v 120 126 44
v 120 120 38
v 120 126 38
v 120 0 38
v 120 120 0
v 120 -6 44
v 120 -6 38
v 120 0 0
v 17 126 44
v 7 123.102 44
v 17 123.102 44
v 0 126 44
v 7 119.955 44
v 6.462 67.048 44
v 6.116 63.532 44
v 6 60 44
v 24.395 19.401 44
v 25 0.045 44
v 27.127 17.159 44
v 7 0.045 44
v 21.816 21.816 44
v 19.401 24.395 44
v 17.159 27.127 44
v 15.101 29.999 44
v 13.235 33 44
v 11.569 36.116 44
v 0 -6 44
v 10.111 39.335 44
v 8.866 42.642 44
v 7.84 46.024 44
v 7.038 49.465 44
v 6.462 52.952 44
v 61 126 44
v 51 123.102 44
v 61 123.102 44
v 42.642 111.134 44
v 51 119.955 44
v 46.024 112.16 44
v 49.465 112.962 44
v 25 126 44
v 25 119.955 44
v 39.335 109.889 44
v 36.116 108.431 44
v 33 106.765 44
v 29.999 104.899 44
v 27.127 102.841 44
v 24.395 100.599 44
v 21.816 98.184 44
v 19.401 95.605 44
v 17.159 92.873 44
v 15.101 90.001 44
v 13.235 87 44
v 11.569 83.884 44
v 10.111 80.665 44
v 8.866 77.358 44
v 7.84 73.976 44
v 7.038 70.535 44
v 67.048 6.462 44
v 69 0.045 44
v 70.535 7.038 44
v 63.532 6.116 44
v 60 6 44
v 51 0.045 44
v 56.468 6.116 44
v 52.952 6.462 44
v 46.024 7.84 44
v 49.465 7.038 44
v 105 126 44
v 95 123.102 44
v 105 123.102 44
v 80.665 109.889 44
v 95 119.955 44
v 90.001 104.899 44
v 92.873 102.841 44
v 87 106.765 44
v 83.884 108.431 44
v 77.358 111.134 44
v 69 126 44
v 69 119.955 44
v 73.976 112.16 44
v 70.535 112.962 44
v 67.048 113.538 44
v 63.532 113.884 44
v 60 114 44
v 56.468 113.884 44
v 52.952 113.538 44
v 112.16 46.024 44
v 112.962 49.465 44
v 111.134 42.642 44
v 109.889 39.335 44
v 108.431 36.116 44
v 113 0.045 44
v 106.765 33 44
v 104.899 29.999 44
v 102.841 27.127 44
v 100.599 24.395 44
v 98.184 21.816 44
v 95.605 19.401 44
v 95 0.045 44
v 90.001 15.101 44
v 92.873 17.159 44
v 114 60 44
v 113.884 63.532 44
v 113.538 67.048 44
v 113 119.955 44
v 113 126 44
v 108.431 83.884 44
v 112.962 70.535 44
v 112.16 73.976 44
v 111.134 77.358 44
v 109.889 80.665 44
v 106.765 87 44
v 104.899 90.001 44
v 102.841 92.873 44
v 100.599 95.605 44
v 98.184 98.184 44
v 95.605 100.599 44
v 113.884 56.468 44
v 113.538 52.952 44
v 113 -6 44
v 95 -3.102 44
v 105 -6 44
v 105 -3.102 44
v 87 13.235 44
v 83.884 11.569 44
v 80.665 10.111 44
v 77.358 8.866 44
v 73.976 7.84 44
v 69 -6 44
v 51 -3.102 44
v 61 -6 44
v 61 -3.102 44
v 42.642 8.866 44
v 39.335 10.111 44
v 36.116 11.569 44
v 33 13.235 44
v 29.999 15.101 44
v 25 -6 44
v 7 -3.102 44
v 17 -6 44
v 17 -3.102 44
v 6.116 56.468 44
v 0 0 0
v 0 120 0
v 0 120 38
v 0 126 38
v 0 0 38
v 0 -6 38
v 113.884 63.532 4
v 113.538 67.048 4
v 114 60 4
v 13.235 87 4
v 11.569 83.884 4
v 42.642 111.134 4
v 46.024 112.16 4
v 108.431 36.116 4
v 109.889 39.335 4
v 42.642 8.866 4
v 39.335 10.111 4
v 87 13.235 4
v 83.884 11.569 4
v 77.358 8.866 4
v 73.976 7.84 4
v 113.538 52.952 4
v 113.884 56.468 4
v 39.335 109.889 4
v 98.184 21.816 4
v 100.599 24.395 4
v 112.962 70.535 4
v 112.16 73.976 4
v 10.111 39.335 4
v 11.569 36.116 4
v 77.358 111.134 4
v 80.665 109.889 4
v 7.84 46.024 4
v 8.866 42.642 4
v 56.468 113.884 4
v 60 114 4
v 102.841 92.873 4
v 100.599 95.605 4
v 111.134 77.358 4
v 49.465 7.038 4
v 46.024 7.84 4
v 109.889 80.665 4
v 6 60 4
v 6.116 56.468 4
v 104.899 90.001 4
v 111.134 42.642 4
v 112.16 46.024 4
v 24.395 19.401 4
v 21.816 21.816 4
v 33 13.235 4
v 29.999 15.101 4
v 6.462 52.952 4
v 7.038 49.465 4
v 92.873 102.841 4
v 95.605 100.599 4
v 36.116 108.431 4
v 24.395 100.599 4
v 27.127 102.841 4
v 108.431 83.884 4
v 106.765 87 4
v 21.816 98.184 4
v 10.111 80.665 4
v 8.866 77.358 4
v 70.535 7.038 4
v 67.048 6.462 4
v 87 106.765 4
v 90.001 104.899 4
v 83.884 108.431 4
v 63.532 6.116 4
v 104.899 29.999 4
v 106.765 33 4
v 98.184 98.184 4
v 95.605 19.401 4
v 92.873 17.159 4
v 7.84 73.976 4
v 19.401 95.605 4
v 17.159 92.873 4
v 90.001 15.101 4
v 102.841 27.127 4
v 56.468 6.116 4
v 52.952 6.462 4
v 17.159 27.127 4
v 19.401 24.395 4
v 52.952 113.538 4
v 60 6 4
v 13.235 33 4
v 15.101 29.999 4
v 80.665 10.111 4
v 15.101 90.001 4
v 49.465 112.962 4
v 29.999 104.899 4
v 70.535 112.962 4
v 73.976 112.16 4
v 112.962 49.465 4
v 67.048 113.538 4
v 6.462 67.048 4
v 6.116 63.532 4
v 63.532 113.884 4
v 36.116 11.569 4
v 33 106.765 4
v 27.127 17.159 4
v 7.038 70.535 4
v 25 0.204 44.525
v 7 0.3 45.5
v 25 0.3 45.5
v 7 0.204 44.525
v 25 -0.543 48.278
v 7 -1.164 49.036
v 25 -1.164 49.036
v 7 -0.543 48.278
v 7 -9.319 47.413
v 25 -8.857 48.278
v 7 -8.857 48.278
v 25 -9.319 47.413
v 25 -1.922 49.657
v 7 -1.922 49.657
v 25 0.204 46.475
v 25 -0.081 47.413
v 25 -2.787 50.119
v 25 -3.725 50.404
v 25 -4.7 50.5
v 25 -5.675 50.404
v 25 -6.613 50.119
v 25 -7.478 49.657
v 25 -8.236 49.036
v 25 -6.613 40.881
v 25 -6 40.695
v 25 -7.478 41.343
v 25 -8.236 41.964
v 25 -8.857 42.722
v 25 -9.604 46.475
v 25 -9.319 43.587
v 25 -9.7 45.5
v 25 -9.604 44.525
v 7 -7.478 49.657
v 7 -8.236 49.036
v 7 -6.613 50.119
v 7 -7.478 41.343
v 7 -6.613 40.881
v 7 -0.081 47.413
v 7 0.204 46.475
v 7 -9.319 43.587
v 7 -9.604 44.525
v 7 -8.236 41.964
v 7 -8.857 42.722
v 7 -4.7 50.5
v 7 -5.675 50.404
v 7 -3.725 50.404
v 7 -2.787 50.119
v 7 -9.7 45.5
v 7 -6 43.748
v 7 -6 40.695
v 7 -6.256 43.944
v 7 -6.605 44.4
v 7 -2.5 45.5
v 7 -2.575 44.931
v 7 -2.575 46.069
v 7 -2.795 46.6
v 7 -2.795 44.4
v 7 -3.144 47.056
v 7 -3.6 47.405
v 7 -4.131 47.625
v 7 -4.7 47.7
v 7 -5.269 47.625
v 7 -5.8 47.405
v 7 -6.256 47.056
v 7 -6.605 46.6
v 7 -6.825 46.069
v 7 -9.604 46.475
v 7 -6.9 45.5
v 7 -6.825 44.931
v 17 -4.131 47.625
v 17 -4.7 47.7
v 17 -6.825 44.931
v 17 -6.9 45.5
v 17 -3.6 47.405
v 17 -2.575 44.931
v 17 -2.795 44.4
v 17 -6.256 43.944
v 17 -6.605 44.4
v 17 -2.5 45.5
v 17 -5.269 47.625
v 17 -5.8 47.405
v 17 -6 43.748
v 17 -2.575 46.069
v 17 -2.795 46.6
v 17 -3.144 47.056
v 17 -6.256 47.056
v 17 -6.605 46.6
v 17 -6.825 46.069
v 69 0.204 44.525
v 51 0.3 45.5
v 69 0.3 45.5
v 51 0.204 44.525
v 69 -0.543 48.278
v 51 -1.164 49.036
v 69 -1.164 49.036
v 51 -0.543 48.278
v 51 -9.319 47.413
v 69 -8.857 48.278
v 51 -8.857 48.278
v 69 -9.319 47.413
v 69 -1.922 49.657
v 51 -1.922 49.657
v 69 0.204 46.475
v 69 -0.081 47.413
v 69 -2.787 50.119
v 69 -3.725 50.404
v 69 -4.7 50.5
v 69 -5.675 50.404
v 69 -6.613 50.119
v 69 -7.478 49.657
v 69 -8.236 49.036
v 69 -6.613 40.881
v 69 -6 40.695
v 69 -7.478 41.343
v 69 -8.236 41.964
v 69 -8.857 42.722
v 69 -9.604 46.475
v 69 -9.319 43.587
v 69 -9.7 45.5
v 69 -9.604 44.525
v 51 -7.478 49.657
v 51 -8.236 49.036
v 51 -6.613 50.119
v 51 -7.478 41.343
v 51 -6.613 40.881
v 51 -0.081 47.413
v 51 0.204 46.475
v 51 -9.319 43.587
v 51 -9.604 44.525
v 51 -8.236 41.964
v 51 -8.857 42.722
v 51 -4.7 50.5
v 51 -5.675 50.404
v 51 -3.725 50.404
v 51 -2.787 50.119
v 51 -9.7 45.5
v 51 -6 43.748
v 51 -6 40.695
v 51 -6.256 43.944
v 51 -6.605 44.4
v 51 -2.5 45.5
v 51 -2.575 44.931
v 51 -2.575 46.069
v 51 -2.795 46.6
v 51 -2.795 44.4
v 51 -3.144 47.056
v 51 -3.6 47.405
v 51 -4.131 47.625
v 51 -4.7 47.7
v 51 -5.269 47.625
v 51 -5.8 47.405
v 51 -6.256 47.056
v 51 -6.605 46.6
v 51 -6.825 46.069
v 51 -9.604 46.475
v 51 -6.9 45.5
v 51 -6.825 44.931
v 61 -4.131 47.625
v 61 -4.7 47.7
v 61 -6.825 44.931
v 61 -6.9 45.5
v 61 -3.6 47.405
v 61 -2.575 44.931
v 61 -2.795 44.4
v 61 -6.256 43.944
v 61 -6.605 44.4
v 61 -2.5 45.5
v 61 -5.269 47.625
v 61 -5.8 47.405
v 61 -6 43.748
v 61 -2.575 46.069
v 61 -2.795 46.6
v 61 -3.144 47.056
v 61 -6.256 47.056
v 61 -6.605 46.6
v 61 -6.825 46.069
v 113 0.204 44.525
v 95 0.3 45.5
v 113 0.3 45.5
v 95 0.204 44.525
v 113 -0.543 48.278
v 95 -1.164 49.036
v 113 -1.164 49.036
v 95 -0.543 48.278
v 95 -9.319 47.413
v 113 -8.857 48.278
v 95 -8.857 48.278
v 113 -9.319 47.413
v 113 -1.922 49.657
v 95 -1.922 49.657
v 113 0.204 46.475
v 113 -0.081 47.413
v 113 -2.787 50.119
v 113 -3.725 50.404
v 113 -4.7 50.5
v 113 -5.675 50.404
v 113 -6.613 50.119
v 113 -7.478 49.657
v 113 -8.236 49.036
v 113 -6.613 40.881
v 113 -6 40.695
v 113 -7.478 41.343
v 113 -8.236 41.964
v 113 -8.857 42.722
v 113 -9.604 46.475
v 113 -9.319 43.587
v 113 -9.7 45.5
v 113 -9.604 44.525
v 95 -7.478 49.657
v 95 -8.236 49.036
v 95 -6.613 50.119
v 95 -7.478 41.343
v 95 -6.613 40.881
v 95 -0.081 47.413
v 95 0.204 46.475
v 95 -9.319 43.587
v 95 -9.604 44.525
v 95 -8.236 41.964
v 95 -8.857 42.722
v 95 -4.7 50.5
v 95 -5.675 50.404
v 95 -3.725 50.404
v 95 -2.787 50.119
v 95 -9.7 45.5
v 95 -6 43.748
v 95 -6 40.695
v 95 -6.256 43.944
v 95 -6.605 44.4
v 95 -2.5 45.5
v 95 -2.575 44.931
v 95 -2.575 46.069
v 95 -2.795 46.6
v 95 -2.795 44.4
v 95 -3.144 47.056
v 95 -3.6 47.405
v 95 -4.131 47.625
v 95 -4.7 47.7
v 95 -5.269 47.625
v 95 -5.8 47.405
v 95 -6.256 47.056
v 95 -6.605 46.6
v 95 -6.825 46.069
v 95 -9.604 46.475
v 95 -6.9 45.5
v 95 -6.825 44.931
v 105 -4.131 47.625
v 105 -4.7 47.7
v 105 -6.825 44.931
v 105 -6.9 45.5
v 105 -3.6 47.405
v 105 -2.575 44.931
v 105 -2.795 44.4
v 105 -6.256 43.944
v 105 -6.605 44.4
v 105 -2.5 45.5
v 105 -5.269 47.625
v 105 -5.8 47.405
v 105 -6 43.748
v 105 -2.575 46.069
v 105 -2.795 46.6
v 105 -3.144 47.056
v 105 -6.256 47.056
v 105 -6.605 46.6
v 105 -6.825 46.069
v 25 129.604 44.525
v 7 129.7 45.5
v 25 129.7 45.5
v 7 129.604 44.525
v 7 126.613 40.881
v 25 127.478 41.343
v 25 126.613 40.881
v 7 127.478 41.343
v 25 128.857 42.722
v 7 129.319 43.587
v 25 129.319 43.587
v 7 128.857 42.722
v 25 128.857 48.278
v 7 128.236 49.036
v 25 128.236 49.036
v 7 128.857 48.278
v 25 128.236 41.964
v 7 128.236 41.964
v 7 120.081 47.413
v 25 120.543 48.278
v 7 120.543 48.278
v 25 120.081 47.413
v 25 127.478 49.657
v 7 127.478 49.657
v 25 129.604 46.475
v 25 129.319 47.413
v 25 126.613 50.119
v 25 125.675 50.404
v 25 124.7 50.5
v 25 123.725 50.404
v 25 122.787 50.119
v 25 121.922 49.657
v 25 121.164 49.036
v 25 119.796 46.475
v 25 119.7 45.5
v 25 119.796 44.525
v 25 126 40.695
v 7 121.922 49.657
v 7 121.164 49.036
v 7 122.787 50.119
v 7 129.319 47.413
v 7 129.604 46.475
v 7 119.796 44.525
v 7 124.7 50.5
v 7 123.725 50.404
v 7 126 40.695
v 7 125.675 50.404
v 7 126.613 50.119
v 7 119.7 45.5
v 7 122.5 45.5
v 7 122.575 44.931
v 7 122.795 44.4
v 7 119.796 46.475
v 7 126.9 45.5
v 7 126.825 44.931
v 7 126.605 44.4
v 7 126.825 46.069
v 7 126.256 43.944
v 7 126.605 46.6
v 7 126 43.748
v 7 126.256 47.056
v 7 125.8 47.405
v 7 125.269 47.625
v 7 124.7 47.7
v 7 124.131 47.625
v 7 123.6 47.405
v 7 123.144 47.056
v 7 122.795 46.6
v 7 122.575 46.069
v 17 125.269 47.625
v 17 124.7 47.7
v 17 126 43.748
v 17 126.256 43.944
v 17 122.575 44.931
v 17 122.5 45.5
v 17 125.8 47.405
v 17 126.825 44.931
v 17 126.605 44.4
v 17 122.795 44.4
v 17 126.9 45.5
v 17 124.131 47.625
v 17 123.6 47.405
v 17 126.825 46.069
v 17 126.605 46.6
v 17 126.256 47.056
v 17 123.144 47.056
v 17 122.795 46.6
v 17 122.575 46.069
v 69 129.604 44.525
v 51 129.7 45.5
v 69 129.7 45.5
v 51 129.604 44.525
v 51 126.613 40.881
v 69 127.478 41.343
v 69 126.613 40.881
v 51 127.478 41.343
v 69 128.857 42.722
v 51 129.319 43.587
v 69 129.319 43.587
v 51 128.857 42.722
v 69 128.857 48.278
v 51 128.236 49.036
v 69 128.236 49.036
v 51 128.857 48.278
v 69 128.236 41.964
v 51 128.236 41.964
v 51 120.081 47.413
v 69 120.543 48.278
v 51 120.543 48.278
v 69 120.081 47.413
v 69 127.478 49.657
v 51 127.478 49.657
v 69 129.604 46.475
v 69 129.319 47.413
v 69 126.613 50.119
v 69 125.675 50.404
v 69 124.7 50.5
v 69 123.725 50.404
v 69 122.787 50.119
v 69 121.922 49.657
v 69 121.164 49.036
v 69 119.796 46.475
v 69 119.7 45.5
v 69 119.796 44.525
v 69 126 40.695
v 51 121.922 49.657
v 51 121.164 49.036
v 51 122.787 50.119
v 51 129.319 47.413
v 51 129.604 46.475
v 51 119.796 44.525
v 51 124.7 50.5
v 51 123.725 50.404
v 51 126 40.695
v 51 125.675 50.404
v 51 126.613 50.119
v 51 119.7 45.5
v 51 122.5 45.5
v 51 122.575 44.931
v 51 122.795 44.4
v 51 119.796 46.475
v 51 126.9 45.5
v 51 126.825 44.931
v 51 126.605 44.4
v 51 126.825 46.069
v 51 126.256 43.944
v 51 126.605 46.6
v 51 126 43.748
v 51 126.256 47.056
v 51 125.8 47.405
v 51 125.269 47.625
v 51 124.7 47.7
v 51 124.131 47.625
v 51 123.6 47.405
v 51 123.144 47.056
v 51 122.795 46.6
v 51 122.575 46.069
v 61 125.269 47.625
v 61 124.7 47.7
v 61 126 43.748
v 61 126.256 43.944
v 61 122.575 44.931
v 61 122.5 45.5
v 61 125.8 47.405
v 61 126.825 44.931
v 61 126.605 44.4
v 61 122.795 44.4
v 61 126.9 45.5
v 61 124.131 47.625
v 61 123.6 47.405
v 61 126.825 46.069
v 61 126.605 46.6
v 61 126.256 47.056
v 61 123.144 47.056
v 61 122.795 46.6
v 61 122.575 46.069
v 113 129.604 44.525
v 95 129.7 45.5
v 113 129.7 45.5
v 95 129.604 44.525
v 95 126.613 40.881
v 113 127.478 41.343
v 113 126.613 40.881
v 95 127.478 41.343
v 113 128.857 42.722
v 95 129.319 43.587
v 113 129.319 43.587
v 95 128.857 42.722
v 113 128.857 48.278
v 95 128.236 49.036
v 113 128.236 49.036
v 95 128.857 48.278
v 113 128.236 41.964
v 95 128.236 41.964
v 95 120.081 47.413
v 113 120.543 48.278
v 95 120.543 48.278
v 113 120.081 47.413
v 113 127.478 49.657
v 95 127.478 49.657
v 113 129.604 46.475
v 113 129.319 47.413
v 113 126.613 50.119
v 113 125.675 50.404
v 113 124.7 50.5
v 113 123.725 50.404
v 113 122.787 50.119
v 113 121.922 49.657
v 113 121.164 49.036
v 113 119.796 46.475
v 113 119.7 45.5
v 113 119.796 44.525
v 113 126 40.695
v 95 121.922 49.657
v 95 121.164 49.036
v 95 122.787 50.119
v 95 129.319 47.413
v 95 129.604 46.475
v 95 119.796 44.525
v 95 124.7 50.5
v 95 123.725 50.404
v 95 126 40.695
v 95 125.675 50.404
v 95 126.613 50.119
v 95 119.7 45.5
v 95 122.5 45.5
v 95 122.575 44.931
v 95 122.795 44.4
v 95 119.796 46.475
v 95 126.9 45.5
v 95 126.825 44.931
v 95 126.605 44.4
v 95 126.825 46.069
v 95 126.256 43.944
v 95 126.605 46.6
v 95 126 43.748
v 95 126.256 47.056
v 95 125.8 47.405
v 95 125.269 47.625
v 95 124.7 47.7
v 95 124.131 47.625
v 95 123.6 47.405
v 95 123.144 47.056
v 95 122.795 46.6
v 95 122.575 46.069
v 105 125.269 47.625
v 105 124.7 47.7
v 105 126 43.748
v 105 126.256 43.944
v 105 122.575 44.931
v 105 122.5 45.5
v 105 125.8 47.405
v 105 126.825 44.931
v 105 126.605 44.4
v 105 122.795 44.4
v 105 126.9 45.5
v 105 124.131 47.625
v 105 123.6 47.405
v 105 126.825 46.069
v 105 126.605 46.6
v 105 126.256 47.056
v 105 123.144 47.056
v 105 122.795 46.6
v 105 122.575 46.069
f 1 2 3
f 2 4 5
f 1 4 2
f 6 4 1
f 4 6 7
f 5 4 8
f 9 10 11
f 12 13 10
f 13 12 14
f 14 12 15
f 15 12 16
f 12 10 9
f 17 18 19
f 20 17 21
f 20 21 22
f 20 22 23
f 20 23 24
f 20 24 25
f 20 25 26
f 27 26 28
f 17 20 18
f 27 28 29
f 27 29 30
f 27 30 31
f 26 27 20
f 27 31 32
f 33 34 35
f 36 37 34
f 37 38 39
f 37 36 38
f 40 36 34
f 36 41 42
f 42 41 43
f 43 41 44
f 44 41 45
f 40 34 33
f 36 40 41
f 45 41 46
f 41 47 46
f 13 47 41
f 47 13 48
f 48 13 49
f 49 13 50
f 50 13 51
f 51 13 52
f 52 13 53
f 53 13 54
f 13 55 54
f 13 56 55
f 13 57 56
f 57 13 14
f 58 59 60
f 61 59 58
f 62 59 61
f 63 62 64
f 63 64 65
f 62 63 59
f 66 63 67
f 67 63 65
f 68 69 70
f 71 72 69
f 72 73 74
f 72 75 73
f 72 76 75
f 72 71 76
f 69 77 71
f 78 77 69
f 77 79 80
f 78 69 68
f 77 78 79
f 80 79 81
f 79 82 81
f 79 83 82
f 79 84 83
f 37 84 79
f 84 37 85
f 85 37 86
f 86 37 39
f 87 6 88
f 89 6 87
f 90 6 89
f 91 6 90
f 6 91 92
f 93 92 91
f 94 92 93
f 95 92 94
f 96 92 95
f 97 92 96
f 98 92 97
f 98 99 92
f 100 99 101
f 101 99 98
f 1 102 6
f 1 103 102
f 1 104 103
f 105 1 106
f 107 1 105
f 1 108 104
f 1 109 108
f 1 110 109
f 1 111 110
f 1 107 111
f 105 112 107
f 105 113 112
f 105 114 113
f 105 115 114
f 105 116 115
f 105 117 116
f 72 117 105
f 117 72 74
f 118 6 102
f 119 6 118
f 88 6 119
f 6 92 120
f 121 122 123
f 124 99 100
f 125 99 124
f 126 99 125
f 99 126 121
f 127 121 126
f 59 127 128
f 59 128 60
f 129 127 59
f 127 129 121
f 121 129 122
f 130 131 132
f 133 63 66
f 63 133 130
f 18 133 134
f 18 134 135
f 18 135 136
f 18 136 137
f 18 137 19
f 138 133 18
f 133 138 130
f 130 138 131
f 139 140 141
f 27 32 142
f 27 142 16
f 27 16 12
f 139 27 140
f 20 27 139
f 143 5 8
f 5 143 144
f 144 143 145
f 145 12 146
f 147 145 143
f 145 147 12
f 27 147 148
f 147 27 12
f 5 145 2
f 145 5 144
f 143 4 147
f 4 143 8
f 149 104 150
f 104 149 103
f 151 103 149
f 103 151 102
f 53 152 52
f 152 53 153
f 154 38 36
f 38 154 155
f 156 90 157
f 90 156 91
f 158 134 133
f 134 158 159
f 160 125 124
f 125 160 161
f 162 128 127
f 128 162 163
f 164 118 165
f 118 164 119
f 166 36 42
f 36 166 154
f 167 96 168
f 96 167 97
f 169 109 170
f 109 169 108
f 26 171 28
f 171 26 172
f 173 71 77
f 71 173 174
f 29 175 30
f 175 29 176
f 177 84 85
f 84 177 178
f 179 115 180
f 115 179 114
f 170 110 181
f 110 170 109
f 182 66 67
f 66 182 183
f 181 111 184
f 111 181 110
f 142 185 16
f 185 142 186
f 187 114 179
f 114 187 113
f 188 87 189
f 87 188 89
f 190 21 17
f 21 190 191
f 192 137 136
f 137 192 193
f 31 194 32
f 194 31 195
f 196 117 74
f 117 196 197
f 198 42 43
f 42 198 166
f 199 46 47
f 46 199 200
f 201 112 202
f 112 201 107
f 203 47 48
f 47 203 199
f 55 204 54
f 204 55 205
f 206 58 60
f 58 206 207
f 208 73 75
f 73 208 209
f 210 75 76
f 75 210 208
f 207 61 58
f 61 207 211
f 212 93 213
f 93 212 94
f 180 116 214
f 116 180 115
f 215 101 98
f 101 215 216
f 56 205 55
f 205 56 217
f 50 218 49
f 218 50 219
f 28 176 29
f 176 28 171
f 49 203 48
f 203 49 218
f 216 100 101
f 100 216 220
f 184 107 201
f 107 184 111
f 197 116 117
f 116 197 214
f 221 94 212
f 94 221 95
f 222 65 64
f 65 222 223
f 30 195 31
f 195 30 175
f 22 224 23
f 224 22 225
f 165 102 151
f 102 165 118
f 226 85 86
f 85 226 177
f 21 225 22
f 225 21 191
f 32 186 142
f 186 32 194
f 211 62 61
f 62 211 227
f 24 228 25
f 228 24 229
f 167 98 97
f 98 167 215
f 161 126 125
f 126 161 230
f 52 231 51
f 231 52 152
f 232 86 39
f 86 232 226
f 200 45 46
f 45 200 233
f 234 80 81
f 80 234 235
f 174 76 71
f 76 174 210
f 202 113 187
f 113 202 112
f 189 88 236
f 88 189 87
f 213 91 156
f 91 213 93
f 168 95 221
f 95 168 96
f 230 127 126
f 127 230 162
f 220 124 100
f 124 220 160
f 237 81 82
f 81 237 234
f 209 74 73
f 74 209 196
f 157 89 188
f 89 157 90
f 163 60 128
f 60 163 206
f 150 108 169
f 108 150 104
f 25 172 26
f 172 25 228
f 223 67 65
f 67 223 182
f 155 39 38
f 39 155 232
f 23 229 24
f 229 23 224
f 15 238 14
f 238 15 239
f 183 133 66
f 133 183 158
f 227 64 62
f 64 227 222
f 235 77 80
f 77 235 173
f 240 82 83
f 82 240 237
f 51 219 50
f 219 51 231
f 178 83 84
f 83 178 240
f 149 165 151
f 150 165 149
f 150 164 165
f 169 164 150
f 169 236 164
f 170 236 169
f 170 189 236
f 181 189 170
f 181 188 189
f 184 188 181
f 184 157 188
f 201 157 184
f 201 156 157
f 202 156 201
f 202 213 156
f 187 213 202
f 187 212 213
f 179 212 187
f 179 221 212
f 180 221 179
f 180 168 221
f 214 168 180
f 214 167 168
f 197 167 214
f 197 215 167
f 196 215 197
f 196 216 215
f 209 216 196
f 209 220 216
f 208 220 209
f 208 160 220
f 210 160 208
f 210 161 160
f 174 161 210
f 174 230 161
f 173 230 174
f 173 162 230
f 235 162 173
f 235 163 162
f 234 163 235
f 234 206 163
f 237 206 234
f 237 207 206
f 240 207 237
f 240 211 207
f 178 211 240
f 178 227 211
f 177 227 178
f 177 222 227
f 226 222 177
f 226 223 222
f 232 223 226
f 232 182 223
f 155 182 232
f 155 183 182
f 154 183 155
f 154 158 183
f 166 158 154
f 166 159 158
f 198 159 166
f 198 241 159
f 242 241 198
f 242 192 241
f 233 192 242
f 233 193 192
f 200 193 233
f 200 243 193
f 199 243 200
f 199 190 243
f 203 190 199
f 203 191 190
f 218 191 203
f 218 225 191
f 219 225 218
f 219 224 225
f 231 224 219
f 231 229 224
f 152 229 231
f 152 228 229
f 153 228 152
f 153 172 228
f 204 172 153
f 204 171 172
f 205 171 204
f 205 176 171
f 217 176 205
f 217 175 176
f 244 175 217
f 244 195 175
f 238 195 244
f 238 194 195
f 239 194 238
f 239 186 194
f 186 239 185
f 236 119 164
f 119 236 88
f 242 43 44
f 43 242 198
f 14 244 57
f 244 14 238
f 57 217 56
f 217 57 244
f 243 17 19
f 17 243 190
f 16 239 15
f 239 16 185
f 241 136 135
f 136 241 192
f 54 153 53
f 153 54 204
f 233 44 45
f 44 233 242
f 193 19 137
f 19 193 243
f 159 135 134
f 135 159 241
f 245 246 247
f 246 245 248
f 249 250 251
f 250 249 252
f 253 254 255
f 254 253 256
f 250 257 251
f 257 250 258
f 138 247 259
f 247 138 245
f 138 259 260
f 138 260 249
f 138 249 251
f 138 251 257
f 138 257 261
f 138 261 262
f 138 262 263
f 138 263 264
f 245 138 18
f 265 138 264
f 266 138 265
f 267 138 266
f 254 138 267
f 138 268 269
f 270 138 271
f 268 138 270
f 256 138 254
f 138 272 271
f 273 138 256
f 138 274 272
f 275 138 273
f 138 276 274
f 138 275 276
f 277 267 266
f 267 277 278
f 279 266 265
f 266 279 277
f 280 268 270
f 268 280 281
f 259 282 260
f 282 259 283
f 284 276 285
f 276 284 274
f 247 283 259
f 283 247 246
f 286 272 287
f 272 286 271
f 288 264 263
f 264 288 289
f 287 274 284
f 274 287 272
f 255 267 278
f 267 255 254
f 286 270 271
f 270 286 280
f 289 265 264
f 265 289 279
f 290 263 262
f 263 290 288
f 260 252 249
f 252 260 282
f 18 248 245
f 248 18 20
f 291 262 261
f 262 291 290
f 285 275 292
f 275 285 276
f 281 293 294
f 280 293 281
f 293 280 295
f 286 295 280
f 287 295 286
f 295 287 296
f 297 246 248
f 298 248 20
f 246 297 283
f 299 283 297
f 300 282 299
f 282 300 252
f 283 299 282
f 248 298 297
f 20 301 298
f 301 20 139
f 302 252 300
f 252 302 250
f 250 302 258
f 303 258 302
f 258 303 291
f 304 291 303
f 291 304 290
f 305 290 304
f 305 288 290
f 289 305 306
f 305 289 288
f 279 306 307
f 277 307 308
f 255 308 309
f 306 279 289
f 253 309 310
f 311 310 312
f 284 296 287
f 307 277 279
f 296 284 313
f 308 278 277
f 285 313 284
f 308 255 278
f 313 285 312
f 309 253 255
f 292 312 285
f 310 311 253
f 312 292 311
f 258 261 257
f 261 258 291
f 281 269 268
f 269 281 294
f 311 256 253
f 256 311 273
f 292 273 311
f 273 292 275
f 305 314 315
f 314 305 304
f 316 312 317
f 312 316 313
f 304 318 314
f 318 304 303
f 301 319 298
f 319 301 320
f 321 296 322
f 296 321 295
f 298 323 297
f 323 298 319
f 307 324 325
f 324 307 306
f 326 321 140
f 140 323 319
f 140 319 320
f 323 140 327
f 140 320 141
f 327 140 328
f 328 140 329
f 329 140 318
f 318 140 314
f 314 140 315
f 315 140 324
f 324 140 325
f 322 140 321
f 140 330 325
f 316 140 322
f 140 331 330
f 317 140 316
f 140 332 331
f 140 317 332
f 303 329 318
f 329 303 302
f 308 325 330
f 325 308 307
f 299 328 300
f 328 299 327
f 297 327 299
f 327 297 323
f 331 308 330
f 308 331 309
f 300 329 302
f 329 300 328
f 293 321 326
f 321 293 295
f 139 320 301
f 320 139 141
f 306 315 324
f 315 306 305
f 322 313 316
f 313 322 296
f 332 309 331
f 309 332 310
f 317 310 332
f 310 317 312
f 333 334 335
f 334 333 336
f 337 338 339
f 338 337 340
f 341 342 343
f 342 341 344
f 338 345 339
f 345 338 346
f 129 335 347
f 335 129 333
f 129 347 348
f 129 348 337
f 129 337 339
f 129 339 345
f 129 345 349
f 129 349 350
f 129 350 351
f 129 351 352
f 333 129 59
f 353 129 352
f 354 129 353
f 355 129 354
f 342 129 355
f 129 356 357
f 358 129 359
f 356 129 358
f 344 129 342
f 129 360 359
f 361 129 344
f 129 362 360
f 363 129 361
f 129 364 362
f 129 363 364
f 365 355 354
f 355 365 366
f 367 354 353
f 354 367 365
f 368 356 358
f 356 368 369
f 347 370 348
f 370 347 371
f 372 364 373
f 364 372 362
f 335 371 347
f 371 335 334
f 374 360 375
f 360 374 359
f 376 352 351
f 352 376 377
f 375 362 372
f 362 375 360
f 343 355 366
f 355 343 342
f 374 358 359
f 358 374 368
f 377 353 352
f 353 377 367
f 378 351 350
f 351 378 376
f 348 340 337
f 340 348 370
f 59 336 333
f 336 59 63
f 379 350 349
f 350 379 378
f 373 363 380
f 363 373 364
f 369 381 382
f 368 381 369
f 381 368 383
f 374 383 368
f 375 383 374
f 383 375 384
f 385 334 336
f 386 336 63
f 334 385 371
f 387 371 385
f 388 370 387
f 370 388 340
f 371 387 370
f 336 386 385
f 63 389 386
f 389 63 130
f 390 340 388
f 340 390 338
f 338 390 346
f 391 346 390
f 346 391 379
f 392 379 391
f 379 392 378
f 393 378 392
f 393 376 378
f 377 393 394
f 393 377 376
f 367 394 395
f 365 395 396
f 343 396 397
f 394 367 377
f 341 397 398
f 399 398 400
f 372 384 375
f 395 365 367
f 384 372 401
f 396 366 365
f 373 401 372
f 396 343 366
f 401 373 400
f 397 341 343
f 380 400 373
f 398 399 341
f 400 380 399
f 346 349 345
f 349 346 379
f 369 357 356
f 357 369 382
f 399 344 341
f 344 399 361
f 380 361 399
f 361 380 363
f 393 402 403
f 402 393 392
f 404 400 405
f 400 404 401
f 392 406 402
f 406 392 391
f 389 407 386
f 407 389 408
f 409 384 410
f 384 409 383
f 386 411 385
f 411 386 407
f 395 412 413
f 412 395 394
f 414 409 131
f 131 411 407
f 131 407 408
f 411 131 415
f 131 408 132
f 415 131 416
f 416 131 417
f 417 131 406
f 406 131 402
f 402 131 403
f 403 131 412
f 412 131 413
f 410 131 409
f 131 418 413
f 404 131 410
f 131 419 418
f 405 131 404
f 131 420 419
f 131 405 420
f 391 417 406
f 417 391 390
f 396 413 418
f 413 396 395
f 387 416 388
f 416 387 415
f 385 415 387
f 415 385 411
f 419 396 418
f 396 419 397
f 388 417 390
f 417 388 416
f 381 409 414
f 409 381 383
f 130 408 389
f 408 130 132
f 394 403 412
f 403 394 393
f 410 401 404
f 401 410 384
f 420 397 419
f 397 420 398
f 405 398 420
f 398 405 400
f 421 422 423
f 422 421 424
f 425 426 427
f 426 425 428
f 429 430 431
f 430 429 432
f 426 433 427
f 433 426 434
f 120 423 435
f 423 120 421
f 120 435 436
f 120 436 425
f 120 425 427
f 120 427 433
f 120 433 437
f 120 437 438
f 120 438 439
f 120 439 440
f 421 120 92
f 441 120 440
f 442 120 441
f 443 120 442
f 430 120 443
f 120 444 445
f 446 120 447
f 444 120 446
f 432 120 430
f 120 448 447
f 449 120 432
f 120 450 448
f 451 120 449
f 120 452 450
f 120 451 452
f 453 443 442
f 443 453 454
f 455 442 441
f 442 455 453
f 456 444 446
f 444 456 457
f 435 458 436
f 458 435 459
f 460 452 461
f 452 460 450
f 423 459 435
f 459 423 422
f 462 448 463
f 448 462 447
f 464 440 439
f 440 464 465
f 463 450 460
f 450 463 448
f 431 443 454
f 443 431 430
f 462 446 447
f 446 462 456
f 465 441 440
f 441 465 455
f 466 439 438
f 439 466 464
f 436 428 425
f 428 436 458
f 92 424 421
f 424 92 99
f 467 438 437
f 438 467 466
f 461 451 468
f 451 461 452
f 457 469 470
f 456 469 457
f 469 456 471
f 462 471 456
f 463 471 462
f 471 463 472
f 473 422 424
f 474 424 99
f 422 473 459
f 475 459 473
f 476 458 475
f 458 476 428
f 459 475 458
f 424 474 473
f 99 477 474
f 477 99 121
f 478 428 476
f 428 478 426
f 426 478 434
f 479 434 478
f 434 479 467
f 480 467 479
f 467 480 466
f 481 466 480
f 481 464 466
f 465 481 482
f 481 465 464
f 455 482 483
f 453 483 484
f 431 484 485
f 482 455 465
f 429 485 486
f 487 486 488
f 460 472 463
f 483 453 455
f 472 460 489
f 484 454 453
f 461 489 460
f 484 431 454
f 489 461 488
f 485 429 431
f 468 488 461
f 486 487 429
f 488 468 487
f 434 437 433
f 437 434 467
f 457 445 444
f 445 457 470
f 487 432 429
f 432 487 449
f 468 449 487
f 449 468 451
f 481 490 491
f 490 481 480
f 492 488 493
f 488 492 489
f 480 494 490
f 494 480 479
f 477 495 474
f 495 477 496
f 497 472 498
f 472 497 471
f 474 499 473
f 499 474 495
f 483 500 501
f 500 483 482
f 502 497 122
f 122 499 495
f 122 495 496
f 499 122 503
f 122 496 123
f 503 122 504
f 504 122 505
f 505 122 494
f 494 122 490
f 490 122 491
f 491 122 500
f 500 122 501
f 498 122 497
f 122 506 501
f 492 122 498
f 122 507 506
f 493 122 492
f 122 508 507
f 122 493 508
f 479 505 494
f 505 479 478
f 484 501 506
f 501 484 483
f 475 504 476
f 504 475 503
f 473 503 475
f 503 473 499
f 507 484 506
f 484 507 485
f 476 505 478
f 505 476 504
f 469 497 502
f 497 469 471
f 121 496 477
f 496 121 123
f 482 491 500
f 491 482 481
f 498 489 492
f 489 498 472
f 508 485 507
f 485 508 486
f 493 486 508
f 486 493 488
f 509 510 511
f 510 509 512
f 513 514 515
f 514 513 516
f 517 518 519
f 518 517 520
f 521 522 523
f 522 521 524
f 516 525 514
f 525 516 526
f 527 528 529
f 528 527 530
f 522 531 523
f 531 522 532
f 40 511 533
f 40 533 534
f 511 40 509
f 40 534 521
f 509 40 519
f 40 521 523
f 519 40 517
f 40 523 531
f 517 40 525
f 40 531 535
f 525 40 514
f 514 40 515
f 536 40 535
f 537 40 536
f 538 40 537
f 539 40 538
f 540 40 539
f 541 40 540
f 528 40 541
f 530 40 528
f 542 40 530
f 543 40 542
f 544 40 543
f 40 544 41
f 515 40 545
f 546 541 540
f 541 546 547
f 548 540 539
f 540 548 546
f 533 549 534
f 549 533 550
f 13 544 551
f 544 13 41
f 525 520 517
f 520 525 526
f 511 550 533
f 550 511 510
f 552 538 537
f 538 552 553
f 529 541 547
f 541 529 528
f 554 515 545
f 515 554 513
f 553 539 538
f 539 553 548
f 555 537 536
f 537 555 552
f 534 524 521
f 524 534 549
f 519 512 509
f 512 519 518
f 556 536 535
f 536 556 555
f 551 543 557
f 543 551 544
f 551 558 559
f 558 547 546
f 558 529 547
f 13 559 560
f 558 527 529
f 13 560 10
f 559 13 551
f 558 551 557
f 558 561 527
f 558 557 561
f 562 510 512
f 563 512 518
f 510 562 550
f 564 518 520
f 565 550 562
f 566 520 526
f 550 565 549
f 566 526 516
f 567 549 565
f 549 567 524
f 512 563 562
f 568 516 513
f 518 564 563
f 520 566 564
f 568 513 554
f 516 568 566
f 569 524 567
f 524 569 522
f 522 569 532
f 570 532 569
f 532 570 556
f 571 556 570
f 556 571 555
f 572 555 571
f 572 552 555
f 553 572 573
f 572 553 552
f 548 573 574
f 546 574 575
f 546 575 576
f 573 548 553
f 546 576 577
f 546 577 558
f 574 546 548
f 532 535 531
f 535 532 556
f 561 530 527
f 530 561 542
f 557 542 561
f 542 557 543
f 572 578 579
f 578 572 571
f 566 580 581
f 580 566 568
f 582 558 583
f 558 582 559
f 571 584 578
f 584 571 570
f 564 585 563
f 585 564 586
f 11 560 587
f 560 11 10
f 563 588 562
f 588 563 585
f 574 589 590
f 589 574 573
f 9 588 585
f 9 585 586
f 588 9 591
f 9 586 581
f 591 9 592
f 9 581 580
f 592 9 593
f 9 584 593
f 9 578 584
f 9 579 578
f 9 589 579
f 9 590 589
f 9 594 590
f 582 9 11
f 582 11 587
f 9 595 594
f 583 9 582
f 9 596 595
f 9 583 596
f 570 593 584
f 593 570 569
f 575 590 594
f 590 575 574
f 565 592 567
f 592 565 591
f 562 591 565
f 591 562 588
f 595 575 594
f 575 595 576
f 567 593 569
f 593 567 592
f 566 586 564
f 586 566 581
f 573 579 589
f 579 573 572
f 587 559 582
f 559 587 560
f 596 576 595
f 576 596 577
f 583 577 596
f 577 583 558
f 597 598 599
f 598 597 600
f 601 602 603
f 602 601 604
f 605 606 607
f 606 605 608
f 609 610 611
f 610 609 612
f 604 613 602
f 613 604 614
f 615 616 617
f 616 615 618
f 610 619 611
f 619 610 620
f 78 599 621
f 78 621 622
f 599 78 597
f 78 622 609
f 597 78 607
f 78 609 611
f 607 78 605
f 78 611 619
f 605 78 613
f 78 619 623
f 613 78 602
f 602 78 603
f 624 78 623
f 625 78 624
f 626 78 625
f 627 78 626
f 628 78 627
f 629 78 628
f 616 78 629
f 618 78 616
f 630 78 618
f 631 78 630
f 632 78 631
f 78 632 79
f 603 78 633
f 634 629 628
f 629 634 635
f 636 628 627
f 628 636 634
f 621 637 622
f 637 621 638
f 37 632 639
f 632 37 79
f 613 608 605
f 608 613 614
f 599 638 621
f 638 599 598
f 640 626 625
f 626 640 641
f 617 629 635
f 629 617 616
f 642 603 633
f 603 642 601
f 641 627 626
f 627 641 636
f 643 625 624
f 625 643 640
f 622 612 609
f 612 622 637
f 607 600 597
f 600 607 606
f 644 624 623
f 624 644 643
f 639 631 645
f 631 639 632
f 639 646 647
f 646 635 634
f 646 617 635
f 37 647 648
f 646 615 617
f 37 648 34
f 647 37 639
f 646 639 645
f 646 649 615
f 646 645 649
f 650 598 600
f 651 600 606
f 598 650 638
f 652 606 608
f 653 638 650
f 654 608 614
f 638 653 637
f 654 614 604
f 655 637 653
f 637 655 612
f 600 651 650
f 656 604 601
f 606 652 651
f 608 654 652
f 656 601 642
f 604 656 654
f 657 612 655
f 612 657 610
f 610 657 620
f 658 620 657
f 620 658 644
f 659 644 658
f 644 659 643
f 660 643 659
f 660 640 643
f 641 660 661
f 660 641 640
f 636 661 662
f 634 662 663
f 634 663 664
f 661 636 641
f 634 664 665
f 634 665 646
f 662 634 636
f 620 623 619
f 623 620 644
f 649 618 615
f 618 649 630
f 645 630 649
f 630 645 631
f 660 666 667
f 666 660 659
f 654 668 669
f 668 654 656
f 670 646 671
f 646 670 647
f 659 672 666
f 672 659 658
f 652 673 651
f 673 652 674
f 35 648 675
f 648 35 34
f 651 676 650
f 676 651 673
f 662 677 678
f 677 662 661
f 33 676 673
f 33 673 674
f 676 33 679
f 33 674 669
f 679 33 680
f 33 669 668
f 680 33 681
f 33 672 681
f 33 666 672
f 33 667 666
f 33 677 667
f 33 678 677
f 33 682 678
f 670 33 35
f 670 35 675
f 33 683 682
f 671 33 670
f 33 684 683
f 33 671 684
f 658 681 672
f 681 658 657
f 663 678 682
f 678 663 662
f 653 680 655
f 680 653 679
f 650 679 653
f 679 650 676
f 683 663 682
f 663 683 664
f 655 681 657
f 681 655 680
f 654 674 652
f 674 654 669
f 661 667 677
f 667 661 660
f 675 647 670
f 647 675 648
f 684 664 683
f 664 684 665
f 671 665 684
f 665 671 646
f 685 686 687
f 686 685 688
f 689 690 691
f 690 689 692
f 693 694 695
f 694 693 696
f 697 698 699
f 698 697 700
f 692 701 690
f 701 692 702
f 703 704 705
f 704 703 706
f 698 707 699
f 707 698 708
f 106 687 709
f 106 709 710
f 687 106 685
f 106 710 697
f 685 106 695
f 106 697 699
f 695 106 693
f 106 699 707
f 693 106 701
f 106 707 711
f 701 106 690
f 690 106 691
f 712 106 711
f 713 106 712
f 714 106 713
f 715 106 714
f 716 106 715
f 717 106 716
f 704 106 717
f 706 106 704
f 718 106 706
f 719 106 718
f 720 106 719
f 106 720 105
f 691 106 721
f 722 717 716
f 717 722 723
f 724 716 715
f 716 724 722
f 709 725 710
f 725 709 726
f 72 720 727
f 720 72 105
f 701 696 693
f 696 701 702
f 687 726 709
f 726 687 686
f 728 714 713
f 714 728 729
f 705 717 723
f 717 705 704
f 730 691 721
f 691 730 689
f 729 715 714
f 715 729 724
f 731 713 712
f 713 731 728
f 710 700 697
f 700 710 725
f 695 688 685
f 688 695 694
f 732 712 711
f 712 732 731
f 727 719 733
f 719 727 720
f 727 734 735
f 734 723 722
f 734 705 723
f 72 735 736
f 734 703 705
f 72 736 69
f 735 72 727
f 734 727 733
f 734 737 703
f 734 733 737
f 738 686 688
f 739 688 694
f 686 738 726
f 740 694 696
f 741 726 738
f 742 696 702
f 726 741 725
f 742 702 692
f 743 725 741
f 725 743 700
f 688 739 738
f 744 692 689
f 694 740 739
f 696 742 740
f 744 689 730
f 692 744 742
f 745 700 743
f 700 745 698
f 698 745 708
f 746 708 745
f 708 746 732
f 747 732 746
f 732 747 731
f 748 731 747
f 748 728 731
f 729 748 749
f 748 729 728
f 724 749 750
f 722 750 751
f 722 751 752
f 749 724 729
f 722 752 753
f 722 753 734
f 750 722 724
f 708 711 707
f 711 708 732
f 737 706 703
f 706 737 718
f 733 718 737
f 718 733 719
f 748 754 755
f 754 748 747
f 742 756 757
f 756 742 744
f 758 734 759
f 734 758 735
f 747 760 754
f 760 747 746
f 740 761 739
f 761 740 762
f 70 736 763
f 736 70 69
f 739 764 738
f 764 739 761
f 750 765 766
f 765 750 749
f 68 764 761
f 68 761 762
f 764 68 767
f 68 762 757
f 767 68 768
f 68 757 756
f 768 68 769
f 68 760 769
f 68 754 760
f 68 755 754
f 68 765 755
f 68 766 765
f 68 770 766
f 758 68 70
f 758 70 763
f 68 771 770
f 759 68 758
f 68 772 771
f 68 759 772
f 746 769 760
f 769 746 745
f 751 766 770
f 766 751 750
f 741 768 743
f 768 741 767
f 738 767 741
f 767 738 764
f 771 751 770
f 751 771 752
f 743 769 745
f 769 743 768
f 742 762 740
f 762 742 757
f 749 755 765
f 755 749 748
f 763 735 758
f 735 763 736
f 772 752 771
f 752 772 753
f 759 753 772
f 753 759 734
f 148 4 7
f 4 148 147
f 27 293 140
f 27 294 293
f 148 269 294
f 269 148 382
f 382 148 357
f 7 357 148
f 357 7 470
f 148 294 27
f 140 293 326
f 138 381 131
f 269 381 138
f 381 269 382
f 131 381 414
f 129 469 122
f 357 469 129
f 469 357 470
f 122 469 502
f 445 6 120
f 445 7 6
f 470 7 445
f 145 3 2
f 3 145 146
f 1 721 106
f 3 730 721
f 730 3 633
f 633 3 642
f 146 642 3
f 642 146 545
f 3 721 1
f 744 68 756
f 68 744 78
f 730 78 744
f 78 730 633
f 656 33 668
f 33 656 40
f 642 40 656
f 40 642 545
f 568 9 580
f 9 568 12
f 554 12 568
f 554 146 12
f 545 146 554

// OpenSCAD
// file: hinge_v2.scad
// ============================================================
// hinge_v2.scad — shared piano-hinge knuckle geometry
// Pattern along the hinge edge: BASE-FLAP-BASE-FLAP-BASE (5 segments)
// Segment index 0,2,4 = fixed to BASE (rod spins freely inside)
// Segment index 1,3   = fixed to FLAP (rod glued/pinned, rotates with flap)
// ============================================================
include <params_v2.scad>

PATTERN_TOTAL = 5 * KNUCKLE_LEN + 4 * KNUCKLE_GAP;
PATTERN_MARGIN = (FLAP_LEN - PATTERN_TOTAL) / 2;

// Returns the x-start position of segment index i (0..4)
function knuckle_x(i) = PATTERN_MARGIN + i * (KNUCKLE_LEN + KNUCKLE_GAP);

// A single knuckle cylinder, axis along X, with a through-bore for the rod.
// hole_d: ROD_D + ROD_CLEARANCE for a bearing (base) knuckle,
//         ROD_D + 0.1 for a tight/glued (flap) knuckle.
module knuckle(hole_d) {
    difference() {
        rotate([0, 90, 0])
            cylinder(d = KNUCKLE_OD, h = KNUCKLE_LEN, $fn = 32);
        rotate([0, 90, 0])
            cylinder(d = hole_d, h = KNUCKLE_LEN + 2, center = true, $fn = 24);
    }
}

// Row of knuckles at given indices, positioned along X starting at x_offset,
// centered on Y=0 locally (caller translates to the actual hinge edge).
module knuckle_row(indices, hole_d, x_offset = 0) {
    for (i = indices) {
        translate([x_offset + knuckle_x(i), 0, 0])
            knuckle(hole_d);
    }
}

BASE_KNUCKLE_INDICES = [0, 2, 4];
FLAP_KNUCKLE_INDICES = [1, 3];
// file: params_v2.scad
// ============================================================
// Cat Bowl v1 — Round Bowl + Dual Trapdoor Flaps (piano-hinge)
// params_v2.scad — all key dimensions live here
// ============================================================
// NOTE: Independent of the old params.scad (rectangular body /
// halo antenna / hopper design). This is a clean start for the
// current hardware: round 108mm bowl + 2x MG996R servos.
// ============================================================

$fn = 64;

// ---- Bowl (as given: 108mm diameter, 40mm deep) ----
BOWL_DIA      = 108;
BOWL_DEPTH    = 40;
BOWL_RADIUS   = BOWL_DIA / 2;

// ---- Base block (square footprint, round pocket inside) ----
WALL          = 6;                       // wall thickness around bowl pocket
FLOOR_T       = 4;                       // floor thickness under bowl
BASE_SIZE     = BOWL_DIA + 2 * WALL;     // 120mm square
BASE_HEIGHT   = BOWL_DEPTH + FLOOR_T;    // 44mm — top of base = hinge rod height

// ---- Flap (two rectangular flaps, each covers half the top) ----
FLAP_LEN      = BASE_SIZE;               // runs full width along hinge edge (120mm)
FLAP_OVERLAP  = 4;                       // extra reach past centerline for sealing
FLAP_DEPTH    = BASE_SIZE / 2 + FLAP_OVERLAP;  // 64mm
FLAP_T        = 3;                       // flap panel thickness

// ---- Piano hinge (rod + knuckles) ----
ROD_D         = 4;                       // steel/brass rod diameter (verify what you have)
ROD_CLEARANCE = 0.4;                     // bearing clearance for knuckles that spin freely
KNUCKLE_OD    = ROD_D + 6;               // 10mm knuckle outer diameter
KNUCKLE_LEN   = 18;                      // length of each knuckle segment
KNUCKLE_GAP   = 4;                       // gap between knuckle segments
// Alternating pattern along the FLAP_LEN edge: base-flap-base-flap-base (5 segments)
// 3 fixed (base) knuckles + 2 rotating (flap) knuckles, interleaved
ROD_END_PROTRUDE = 12;                   // rod extends past the base footprint for servo coupling
ROD_LENGTH    = FLAP_LEN + 2 * ROD_END_PROTRUDE;
// Rod axis sits at the flap's mid-thickness height when the flap is closed
// and resting on top of the base — NOT at the bare top surface.
ROD_AXIS_Z    = BASE_HEIGHT + FLAP_T / 2;

// ---- MG996R servo (verify with calipers once yours arrive) ----
SERVO_W       = 40.7;   // body length
SERVO_D       = 19.7;   // body width/depth
SERVO_H       = 42.9;   // body height (shaft side up)
SERVO_SHAFT_OFFSET = 30.9; // distance from back edge to shaft, along SERVO_W
SERVO_TAB_SPAN = 54.5;  // outer tab-to-tab width
SERVO_TAB_HOLE_SPACING = 10; // hole spacing within each tab
SERVO_HORN_OD = 24;     // round disc horn diameter (verify)
SERVO_HORN_BOLT_CIRCLE = 19; // horn screw hole circle diameter (verify)

// ---- Mounting hardware ----
M3_CLEAR      = 3.4;    // M3 clearance hole
M3_HEAD       = 6.2;    // M3 pan head clearance
// main file
// ============================================================
// 20_base_v2.scad — square base, round bowl pocket, hinge mounts
// Print orientation: as-is, flat on the bed (pocket facing up).
// ============================================================
include <params_v2.scad>
include <hinge_v2.scad>

SUPPORT_RIDGE_H = 6;   // height of the gusset ridge under each knuckle row
SUPPORT_RIDGE_D = 6;   // how far it projects out from the wall

module base_block() {
    difference() {
        // outer square block
        cube([BASE_SIZE, BASE_SIZE, BASE_HEIGHT]);

        // round bowl pocket, open at top, floor = FLOOR_T thick
        translate([BASE_SIZE / 2, BASE_SIZE / 2, FLOOR_T])
            cylinder(r = BOWL_RADIUS, h = BOWL_DEPTH + 1, $fn = 96);
    }
}

module support_ridge(edge = "front") {
    if (edge == "front") {
        translate([0, -SUPPORT_RIDGE_D, BASE_HEIGHT - SUPPORT_RIDGE_H])
            cube([FLAP_LEN, SUPPORT_RIDGE_D, SUPPORT_RIDGE_H]);
    } else {
        translate([0, BASE_SIZE, BASE_HEIGHT - SUPPORT_RIDGE_H])
            cube([FLAP_LEN, SUPPORT_RIDGE_D, SUPPORT_RIDGE_H]);
    }
}

module base_hinge_knuckles(edge = "front") {
    hole_d = ROD_D + ROD_CLEARANCE;
    overlap = 0.3;
    if (edge == "front") {
        translate([0, -KNUCKLE_OD / 2 + overlap, ROD_AXIS_Z])
            knuckle_row(BASE_KNUCKLE_INDICES, hole_d);
    } else {
        translate([0, BASE_SIZE + KNUCKLE_OD / 2 - overlap, ROD_AXIS_Z])
            knuckle_row(BASE_KNUCKLE_INDICES, hole_d);
    }
}

module base_assembly() {
    base_block();
    support_ridge("front");
    support_ridge("back");
    base_hinge_knuckles("front");
    base_hinge_knuckles("back");
}

base_assembly();
